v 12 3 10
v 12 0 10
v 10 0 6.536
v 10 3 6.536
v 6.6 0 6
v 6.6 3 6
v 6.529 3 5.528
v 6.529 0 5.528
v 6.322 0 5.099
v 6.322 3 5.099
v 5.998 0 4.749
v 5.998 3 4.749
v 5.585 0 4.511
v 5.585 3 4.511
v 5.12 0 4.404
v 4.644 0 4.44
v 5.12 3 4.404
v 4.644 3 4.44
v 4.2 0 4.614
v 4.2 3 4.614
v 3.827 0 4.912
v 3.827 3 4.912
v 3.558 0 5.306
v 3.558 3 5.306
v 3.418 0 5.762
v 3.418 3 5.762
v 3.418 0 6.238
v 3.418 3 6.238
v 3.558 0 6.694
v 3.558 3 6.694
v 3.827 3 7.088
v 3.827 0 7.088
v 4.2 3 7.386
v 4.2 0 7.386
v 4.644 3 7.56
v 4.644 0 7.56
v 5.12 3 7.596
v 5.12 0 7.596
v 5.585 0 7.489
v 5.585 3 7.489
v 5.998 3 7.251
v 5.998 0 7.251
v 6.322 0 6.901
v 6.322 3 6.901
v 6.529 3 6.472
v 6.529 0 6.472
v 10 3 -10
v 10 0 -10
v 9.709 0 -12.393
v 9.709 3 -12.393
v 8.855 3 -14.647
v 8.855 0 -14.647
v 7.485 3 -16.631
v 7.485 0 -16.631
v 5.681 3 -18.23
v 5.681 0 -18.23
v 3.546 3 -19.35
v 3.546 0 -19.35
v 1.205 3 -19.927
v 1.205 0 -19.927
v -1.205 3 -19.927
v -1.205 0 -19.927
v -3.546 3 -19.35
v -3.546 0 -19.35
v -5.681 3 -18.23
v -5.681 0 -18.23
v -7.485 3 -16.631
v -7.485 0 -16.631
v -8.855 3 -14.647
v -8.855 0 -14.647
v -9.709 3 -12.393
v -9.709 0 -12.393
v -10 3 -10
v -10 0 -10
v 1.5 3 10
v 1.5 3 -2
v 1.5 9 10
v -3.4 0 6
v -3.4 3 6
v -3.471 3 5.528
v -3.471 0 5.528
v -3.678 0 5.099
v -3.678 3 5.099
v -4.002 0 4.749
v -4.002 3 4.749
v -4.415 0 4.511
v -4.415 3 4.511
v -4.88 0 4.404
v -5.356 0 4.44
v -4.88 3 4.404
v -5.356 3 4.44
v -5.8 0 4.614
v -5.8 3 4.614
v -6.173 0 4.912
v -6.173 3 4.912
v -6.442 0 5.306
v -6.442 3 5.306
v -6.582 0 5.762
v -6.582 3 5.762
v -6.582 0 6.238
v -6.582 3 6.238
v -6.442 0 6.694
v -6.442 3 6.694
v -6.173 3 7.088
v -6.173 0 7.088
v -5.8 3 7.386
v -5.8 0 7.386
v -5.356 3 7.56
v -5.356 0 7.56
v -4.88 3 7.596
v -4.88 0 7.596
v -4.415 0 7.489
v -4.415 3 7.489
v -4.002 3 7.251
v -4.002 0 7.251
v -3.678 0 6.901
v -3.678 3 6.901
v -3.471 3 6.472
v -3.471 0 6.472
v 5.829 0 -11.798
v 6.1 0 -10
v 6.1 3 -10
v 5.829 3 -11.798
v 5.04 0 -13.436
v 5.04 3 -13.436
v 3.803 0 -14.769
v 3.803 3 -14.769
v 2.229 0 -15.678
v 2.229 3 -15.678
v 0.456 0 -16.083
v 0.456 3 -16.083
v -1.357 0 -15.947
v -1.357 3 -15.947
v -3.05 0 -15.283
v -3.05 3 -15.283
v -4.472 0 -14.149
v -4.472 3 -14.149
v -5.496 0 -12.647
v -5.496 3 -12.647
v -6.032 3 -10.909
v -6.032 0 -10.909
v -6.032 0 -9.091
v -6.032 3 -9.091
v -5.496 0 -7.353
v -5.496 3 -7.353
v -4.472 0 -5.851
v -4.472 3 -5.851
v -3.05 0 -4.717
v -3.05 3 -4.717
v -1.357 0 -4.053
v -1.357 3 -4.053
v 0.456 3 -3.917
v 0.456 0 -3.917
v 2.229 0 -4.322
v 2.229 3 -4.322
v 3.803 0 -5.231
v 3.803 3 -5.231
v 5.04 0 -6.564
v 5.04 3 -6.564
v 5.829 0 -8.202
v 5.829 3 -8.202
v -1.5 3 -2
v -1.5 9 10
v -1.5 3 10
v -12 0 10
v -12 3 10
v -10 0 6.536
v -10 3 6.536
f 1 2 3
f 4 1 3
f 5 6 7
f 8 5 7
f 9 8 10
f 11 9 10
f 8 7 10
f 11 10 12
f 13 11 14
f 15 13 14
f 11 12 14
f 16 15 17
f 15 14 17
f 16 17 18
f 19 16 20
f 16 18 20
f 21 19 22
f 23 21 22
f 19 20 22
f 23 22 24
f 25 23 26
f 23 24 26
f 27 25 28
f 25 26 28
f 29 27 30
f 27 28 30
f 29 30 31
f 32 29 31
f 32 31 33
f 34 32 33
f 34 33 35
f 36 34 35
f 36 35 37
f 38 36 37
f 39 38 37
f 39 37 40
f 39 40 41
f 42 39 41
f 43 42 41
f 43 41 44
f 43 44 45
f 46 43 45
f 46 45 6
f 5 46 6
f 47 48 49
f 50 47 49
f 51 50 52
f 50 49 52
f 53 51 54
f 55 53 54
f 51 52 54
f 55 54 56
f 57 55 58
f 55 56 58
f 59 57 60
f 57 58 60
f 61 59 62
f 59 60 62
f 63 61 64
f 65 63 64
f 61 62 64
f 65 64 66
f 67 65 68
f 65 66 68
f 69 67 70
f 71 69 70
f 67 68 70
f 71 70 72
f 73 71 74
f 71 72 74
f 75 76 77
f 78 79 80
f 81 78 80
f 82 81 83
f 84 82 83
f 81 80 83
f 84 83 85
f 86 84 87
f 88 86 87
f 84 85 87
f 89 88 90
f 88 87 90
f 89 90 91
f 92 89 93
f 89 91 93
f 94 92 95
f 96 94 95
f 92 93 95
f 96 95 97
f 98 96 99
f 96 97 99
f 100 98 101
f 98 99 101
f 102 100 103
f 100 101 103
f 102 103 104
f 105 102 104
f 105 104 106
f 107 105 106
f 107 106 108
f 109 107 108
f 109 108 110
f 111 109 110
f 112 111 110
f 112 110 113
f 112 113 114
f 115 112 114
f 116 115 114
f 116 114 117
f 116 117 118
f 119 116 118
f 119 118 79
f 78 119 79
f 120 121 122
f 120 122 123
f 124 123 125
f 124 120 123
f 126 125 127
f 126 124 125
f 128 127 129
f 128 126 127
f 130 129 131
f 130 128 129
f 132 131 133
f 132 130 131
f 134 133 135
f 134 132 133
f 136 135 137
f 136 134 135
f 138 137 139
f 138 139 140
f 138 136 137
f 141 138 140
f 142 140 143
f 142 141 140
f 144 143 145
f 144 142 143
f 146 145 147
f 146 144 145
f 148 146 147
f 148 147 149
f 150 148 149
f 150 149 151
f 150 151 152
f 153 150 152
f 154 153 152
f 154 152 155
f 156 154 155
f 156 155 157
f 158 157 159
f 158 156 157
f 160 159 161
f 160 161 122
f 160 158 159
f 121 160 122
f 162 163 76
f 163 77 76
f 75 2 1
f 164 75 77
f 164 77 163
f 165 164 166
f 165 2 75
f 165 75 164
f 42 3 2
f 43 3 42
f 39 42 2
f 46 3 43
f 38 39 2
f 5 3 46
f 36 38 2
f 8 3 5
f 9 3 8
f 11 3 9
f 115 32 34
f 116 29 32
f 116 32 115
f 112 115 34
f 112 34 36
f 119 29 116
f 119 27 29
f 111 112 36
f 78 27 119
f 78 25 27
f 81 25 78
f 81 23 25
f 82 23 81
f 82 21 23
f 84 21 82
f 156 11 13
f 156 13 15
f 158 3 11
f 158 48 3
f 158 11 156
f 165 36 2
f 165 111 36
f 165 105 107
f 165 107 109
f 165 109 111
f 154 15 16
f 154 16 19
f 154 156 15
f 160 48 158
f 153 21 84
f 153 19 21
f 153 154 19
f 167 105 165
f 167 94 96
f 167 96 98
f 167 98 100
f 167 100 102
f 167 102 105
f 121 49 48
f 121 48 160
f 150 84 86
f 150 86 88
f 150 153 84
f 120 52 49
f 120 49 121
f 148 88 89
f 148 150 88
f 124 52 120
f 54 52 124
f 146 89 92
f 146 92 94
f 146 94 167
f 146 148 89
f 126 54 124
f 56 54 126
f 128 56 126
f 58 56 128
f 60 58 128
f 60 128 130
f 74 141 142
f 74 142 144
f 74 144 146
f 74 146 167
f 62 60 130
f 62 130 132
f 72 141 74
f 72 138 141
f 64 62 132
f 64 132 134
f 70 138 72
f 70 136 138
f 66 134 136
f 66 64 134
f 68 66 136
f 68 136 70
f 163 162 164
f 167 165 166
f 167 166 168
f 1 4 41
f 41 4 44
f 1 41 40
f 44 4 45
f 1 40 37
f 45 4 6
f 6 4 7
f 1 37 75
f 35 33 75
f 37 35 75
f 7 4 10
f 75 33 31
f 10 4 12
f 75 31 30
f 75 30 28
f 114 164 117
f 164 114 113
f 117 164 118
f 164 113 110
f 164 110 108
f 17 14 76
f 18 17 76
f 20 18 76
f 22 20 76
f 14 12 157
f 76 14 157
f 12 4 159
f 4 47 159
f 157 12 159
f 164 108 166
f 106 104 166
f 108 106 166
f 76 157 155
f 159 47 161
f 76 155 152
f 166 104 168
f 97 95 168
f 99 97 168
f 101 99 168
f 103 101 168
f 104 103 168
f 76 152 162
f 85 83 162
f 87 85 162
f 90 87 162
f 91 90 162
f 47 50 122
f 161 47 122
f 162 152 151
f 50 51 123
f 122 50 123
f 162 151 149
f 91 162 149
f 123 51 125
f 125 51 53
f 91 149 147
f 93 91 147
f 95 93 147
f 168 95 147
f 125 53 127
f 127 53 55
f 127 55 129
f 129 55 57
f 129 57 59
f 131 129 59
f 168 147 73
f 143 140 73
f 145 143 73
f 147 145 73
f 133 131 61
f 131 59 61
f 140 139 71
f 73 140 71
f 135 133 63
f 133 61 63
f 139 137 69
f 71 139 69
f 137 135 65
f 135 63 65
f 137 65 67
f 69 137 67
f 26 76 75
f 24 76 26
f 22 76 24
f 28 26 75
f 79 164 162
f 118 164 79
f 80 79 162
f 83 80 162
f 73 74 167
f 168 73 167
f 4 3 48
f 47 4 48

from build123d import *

# Parameters (mm, degrees)
SKETCH1_R           = 6.1
BOSS_EXTRUDE1_DEPTH = 3
SKETCH2_R           = 1.6
CUT_EXTRUDE1_DEPTH  = 4
BOSS_EXTRUDE2_DEPTH = 1.5
BOSS_EXTRUDE3_DEPTH = 3


with BuildPart() as part:
    # Sketch1 → Boss-Extrude1 (new body)
    with BuildSketch(Plane(origin=(0, 0, 0), x_dir=(1, 0, 0), z_dir=(0, 1, 0))):
        with BuildLine():
            Line((-10, -10), (10, -10))
            Line((10, -10), (10, 10))
            ThreePointArc((10, 10), (0, 20), (-10, 10))
            Line((-10, 10), (-10, -10))
        make_face()
        with Locations((0, 10)):
            Circle(SKETCH1_R, mode=Mode.SUBTRACT)
    extrude(amount=BOSS_EXTRUDE1_DEPTH)

    # Sketch2 → Cut-Extrude1 (cut, through all)
    with BuildSketch(Plane(origin=(0, 3, 0), x_dir=(1, 0, 0), z_dir=(0, 1, 0))):
        with Locations((-5, -6)):
            Circle(SKETCH2_R)
        with Locations((5, -6)):
            Circle(SKETCH2_R)
    extrude(amount=-CUT_EXTRUDE1_DEPTH, mode=Mode.SUBTRACT)

    # Sketch4 → Boss-Extrude2 (add, symmetric)
    with BuildSketch(Plane(origin=(0, 0, 0), x_dir=(0, 0, -1), z_dir=(1, 0, 0))):
        Polygon((-10, 3), (-10, 9), (2, 3), align=None)
    extrude(amount=BOSS_EXTRUDE2_DEPTH, both=True)

    # Sketch5 → Boss-Extrude3 (add)
    with BuildSketch(Plane(origin=(0, 0, 0), x_dir=(1, 0, 0), z_dir=(0, 1, 0))):
        Polygon((-10, -10), (-12, -10), (-10, -6.535898385), align=None)
        Polygon((10, -10), (12, -10), (10, -6.535898385), align=None)
    extrude(amount=BOSS_EXTRUDE3_DEPTH)


solid = part.part
